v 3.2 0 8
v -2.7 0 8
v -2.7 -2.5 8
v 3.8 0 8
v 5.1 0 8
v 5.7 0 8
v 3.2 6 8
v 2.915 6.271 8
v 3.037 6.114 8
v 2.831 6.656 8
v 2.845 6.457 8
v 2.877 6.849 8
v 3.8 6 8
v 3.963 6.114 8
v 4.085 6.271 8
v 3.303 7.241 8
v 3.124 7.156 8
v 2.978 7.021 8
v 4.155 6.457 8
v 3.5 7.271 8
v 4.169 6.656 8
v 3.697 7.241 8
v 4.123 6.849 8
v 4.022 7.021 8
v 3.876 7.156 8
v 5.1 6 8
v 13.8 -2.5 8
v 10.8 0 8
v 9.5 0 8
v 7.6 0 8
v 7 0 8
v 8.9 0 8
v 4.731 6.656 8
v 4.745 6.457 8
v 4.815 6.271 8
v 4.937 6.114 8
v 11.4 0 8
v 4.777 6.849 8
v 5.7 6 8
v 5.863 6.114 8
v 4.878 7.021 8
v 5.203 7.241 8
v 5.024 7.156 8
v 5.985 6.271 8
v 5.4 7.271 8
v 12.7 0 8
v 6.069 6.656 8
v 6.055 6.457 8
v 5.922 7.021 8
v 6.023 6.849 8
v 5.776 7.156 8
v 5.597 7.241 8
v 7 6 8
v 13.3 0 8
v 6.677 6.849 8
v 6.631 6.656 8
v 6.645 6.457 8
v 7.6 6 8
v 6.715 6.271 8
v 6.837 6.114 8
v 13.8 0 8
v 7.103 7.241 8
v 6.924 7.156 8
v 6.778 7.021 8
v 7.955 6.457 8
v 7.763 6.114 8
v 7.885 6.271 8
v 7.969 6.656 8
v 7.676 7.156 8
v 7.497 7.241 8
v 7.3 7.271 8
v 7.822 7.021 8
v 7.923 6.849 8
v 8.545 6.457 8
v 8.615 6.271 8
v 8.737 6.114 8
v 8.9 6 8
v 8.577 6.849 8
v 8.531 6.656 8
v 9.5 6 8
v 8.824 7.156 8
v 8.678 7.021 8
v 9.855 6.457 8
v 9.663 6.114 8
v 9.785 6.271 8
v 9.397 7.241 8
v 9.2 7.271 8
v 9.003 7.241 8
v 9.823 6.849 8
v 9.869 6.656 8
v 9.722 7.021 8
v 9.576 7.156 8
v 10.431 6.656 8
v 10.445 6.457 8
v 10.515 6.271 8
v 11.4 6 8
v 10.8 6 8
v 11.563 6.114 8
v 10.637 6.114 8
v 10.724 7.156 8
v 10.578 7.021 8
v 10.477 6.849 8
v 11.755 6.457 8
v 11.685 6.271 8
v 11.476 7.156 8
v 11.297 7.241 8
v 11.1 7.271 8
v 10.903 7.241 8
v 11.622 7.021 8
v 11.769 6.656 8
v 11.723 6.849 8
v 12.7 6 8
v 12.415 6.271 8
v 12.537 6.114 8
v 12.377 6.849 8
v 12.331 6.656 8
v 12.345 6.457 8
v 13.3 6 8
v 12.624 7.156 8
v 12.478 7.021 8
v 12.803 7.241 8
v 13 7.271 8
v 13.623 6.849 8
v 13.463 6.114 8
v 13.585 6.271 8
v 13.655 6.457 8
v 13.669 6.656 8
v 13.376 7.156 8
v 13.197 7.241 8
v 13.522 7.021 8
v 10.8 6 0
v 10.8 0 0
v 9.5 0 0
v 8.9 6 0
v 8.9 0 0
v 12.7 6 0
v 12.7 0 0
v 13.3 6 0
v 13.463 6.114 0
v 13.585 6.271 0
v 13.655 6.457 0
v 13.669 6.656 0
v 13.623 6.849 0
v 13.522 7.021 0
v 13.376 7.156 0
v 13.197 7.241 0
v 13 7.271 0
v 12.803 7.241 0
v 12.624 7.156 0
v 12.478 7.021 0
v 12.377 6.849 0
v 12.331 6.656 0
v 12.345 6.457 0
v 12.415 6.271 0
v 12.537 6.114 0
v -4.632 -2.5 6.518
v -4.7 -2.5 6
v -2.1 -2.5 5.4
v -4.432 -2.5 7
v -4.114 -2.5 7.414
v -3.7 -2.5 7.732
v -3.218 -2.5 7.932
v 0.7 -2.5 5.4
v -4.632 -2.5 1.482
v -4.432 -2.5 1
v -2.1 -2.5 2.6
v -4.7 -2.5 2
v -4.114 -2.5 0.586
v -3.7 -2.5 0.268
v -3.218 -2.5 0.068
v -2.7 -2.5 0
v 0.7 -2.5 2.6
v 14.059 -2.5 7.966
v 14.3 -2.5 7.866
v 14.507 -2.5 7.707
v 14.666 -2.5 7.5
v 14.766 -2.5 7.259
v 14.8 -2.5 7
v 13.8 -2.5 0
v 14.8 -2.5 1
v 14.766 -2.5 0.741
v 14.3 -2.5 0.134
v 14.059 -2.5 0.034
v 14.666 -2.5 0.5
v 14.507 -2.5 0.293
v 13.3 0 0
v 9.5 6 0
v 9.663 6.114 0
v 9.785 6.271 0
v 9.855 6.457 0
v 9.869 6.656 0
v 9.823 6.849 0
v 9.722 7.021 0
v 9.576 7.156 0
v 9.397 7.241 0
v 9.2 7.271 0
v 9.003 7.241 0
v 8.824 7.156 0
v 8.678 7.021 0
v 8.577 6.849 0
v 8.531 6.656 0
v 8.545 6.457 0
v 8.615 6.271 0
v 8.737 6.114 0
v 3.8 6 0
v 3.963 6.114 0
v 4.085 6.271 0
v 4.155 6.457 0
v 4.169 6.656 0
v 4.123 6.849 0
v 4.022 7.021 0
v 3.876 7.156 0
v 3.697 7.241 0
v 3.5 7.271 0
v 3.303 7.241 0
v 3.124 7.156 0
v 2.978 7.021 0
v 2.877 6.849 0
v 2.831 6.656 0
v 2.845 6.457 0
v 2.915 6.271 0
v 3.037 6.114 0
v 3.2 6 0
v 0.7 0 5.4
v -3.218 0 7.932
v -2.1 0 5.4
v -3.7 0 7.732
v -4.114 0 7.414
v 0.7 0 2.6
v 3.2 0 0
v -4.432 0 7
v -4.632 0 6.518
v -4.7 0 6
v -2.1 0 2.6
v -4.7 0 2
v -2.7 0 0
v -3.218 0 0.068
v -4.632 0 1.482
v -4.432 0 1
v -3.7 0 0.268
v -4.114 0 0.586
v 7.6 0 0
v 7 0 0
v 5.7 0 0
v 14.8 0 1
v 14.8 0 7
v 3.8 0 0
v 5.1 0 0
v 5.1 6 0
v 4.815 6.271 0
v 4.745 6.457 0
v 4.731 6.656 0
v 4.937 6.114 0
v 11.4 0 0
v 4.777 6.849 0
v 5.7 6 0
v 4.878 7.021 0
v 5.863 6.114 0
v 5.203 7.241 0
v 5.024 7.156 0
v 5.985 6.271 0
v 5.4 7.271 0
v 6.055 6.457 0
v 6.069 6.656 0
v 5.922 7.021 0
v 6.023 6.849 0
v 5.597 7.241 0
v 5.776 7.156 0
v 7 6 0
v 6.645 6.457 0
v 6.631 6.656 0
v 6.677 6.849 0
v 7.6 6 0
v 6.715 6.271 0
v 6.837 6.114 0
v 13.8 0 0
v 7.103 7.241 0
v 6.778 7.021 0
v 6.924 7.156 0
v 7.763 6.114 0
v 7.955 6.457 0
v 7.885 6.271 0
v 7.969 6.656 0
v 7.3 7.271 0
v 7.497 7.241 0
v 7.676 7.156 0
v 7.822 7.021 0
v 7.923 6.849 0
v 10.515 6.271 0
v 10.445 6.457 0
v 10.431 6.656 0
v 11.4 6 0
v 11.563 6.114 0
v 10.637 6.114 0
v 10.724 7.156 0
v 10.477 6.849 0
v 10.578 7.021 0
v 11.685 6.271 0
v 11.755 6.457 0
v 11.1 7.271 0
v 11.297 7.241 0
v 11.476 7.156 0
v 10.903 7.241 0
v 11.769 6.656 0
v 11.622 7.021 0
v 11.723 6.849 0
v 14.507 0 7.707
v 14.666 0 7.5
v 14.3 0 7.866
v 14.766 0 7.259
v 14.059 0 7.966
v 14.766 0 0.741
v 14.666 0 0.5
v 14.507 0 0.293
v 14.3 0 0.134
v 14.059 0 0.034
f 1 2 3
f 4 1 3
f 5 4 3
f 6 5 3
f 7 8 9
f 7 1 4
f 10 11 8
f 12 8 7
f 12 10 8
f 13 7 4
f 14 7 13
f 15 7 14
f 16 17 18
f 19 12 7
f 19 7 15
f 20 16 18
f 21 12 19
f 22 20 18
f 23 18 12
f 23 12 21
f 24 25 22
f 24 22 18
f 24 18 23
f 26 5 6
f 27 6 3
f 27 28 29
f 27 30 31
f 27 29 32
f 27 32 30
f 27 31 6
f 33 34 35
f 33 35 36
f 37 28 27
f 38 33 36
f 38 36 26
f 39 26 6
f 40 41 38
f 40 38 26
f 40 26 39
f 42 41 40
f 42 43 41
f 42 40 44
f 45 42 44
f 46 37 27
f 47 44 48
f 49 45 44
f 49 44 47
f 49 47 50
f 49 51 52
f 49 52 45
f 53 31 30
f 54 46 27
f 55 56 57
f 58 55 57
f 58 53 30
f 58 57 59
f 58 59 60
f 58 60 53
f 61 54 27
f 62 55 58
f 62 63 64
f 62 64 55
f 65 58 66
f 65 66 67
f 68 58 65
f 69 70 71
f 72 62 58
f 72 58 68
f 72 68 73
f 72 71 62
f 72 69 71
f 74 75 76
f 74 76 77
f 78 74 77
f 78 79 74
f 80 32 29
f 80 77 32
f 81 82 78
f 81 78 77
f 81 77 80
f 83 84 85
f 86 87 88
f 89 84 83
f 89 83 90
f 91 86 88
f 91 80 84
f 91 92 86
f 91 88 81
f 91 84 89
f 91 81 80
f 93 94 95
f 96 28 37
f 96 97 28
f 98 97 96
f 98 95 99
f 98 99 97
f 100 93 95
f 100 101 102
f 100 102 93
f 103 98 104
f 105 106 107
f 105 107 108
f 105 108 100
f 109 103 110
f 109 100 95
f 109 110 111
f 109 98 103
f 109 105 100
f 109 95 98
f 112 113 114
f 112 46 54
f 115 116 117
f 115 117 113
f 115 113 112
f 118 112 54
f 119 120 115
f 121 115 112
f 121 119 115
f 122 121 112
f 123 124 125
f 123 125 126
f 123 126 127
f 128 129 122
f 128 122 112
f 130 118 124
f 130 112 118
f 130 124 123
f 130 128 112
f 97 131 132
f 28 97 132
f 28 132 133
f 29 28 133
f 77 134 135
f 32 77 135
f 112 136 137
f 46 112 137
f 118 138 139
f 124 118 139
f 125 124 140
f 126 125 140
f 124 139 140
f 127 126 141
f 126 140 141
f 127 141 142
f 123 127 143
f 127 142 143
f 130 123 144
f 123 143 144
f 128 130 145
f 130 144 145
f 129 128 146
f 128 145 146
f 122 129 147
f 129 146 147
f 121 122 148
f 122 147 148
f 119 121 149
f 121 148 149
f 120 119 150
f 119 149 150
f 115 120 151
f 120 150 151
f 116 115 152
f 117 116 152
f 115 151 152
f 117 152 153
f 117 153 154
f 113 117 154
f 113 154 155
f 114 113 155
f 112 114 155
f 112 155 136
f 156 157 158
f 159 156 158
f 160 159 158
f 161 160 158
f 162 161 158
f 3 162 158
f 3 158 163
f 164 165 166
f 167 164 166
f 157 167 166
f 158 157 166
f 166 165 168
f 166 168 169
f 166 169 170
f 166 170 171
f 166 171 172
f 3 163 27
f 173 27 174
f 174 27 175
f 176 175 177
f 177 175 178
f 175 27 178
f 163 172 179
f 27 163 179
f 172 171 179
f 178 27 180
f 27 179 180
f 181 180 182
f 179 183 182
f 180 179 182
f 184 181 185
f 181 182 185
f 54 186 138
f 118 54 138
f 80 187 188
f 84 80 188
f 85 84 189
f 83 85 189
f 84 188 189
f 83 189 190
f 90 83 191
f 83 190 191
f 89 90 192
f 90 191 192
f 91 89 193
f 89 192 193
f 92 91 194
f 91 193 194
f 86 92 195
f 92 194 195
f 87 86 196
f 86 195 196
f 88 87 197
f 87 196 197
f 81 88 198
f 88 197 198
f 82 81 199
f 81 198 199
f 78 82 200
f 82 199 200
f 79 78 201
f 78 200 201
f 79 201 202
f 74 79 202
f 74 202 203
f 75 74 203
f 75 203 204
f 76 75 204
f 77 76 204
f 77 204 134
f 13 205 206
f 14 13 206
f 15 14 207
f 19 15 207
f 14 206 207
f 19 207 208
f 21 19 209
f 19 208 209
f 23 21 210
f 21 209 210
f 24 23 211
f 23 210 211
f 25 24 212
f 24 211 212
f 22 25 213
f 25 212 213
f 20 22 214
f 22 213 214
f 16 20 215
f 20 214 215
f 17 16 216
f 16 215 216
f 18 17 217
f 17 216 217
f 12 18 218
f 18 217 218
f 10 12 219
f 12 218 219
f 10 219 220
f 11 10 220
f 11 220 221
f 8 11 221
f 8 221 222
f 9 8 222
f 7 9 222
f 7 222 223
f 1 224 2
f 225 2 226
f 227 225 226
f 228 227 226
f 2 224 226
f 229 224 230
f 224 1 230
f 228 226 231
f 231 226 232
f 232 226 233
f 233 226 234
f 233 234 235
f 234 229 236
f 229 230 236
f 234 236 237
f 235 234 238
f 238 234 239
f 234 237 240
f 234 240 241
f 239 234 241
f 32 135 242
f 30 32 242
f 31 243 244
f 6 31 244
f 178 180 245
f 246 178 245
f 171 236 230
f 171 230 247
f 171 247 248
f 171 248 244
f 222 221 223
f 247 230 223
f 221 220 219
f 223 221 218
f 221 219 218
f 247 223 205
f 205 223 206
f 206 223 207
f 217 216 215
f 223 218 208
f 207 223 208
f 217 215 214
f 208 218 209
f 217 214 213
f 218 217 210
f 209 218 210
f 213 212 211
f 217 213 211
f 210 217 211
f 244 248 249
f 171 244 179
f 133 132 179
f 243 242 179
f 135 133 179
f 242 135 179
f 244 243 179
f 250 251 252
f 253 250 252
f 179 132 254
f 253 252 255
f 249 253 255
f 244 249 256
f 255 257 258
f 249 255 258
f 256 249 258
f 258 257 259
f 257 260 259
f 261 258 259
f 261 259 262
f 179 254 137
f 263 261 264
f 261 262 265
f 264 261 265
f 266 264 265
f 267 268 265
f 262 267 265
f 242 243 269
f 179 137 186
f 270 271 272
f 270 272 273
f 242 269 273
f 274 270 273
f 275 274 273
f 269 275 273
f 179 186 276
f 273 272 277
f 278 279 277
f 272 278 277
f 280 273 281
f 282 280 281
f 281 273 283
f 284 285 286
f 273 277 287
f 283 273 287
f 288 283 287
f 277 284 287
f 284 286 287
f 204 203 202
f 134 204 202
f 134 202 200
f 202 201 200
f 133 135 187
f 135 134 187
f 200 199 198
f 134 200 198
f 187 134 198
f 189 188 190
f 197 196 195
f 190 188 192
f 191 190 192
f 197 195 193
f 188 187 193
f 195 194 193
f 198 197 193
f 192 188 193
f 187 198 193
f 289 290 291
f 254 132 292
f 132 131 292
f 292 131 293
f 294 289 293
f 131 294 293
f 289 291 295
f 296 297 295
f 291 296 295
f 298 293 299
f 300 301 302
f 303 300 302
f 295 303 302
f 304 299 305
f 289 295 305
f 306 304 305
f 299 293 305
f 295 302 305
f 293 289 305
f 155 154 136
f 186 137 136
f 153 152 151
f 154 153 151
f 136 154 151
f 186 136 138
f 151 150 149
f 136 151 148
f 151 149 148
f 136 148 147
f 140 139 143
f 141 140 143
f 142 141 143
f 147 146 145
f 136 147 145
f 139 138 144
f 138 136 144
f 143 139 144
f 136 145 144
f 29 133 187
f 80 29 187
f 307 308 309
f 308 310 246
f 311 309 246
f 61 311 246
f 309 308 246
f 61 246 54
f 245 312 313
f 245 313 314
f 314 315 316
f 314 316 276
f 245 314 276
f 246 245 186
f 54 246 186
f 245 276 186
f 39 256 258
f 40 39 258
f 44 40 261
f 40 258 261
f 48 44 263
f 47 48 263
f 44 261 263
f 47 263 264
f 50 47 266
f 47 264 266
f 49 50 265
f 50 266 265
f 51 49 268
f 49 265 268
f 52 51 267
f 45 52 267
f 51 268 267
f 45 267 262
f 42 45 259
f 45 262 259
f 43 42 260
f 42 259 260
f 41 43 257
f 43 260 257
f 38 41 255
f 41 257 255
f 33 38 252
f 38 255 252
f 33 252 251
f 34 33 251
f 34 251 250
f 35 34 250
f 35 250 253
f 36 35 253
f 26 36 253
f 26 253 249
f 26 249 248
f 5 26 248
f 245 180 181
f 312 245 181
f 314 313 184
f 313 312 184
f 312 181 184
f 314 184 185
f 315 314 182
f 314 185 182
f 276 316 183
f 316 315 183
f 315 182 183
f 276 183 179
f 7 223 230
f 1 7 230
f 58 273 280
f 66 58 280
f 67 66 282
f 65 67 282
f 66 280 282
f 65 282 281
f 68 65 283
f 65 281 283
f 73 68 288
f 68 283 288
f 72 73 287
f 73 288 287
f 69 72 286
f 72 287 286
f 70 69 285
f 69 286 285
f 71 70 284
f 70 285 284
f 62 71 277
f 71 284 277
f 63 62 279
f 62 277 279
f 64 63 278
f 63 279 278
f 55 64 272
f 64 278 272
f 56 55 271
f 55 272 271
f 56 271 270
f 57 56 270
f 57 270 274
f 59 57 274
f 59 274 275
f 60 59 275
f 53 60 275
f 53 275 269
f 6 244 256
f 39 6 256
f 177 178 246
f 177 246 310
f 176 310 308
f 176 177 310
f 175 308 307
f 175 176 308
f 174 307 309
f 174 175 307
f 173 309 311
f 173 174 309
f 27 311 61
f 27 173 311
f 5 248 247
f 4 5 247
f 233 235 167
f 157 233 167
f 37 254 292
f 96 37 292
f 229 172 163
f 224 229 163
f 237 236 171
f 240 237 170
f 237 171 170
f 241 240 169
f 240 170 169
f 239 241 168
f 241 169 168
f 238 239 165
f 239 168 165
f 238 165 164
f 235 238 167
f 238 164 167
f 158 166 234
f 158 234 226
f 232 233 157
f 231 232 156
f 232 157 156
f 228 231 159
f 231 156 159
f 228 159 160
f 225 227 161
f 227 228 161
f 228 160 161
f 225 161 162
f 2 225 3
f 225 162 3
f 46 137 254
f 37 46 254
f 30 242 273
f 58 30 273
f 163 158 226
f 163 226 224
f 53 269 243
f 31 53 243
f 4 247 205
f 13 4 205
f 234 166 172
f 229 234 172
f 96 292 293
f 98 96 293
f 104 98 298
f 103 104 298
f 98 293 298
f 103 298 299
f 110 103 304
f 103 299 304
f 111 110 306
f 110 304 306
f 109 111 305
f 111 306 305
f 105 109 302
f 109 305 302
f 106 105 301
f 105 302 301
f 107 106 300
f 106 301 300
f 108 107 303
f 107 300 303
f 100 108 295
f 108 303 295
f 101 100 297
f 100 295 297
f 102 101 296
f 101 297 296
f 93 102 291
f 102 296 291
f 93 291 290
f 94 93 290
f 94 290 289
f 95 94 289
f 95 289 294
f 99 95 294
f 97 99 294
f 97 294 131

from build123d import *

# Parameters (mm, degrees)
RESSALTO_EXTRUS_O1_DEPTH = 8
ESBO_O2_W                = 2.8
ESBO_O2_H                = 2.8
CORTE_EXTRUS_O2_DEPTH    = 20.45530599


with BuildPart() as part:
    # Esboço1 → Ressalto-extrusão1 (new body)
    with BuildSketch(Plane.XY):
        with BuildLine():
            Line((0, 0), (-4.7, 0))
            Line((-4.7, 0), (-4.7, -2.5))
            Line((-4.7, -2.5), (-0.2, -2.5))
            Line((-0.2, -2.5), (14.8, -2.5))
            Line((14.8, -2.5), (14.8, 0))
            Line((14.8, 0), (13.3, 0))
            Line((13.3, 0), (13.3, 6))
            ThreePointArc((13.3, 6), (13, 7.270820393), (12.7, 6))
            Line((12.7, 6), (12.7, 0))
            Line((12.7, 0), (11.4, 0))
            Line((11.4, 0), (11.4, 6))
            ThreePointArc((11.4, 6), (11.1, 7.270820393), (10.8, 6))
            Line((10.8, 6), (10.8, 0))
            Line((10.8, 0), (9.5, 0))
            Line((9.5, 0), (9.5, 6))
            ThreePointArc((9.5, 6), (9.2, 7.270820393), (8.9, 6))
            Line((8.9, 6), (8.9, 0))
            Line((8.9, 0), (7.6, 0))
            Line((7.6, 0), (7.6, 6))
            ThreePointArc((7.6, 6), (7.3, 7.270820393), (7, 6))
            Line((7, 6), (7, 0))
            Line((7, 0), (5.7, 0))
            Line((5.7, 0), (5.7, 6))
            ThreePointArc((5.7, 6), (5.4, 7.270820393), (5.1, 6))
            Line((5.1, 6), (5.1, 0))
            Line((5.1, 0), (3.8, 0))
            Line((3.8, 0), (3.8, 6))
            ThreePointArc((3.8, 6), (3.5, 7.270820393), (3.2, 6))
            Line((3.2, 6), (3.2, 0))
            Line((3.2, 0), (1.9, 0))
            Line((1.9, 0), (1.3, 0))
            Line((1.3, 0), (0, 0))
        make_face()
    extrude(amount=RESSALTO_EXTRUS_O1_DEPTH)

    # Esboço2 → Corte-extrusão2 (cut, through all)
    with BuildSketch(Plane.XZ.offset(2.5)):
        with BuildLine():
            Line((-2.7, 8), (-4.7, 8))
            Line((-4.7, 8), (-4.7, 6))
            ThreePointArc((-4.7, 6), (-4.114213562, 7.414213562), (-2.7, 8))
        make_face()
        with BuildLine():
            Line((-4.7, 2), (-4.7, 0))
            Line((-4.7, 0), (-2.7, 0))
            ThreePointArc((-2.7, 0), (-4.114213562, 0.585786438), (-4.7, 2))
        make_face()
        with Locations((-0.7, 4)):
            Rectangle(ESBO_O2_W, ESBO_O2_H)
        with BuildLine():
            Line((13.8, 8), (14.8, 8))
            Line((14.8, 8), (14.8, 7))
            ThreePointArc((14.8, 7), (14.507106781, 7.707106781), (13.8, 8))
        make_face()
        with BuildLine():
            Line((13.8, 0), (14.8, 0))
            Line((14.8, 0), (14.8, 1))
            ThreePointArc((14.8, 1), (14.507106781, 0.292893219), (13.8, 0))
        make_face()
    extrude(amount=-CORTE_EXTRUS_O2_DEPTH, mode=Mode.SUBTRACT)


solid = part.part
